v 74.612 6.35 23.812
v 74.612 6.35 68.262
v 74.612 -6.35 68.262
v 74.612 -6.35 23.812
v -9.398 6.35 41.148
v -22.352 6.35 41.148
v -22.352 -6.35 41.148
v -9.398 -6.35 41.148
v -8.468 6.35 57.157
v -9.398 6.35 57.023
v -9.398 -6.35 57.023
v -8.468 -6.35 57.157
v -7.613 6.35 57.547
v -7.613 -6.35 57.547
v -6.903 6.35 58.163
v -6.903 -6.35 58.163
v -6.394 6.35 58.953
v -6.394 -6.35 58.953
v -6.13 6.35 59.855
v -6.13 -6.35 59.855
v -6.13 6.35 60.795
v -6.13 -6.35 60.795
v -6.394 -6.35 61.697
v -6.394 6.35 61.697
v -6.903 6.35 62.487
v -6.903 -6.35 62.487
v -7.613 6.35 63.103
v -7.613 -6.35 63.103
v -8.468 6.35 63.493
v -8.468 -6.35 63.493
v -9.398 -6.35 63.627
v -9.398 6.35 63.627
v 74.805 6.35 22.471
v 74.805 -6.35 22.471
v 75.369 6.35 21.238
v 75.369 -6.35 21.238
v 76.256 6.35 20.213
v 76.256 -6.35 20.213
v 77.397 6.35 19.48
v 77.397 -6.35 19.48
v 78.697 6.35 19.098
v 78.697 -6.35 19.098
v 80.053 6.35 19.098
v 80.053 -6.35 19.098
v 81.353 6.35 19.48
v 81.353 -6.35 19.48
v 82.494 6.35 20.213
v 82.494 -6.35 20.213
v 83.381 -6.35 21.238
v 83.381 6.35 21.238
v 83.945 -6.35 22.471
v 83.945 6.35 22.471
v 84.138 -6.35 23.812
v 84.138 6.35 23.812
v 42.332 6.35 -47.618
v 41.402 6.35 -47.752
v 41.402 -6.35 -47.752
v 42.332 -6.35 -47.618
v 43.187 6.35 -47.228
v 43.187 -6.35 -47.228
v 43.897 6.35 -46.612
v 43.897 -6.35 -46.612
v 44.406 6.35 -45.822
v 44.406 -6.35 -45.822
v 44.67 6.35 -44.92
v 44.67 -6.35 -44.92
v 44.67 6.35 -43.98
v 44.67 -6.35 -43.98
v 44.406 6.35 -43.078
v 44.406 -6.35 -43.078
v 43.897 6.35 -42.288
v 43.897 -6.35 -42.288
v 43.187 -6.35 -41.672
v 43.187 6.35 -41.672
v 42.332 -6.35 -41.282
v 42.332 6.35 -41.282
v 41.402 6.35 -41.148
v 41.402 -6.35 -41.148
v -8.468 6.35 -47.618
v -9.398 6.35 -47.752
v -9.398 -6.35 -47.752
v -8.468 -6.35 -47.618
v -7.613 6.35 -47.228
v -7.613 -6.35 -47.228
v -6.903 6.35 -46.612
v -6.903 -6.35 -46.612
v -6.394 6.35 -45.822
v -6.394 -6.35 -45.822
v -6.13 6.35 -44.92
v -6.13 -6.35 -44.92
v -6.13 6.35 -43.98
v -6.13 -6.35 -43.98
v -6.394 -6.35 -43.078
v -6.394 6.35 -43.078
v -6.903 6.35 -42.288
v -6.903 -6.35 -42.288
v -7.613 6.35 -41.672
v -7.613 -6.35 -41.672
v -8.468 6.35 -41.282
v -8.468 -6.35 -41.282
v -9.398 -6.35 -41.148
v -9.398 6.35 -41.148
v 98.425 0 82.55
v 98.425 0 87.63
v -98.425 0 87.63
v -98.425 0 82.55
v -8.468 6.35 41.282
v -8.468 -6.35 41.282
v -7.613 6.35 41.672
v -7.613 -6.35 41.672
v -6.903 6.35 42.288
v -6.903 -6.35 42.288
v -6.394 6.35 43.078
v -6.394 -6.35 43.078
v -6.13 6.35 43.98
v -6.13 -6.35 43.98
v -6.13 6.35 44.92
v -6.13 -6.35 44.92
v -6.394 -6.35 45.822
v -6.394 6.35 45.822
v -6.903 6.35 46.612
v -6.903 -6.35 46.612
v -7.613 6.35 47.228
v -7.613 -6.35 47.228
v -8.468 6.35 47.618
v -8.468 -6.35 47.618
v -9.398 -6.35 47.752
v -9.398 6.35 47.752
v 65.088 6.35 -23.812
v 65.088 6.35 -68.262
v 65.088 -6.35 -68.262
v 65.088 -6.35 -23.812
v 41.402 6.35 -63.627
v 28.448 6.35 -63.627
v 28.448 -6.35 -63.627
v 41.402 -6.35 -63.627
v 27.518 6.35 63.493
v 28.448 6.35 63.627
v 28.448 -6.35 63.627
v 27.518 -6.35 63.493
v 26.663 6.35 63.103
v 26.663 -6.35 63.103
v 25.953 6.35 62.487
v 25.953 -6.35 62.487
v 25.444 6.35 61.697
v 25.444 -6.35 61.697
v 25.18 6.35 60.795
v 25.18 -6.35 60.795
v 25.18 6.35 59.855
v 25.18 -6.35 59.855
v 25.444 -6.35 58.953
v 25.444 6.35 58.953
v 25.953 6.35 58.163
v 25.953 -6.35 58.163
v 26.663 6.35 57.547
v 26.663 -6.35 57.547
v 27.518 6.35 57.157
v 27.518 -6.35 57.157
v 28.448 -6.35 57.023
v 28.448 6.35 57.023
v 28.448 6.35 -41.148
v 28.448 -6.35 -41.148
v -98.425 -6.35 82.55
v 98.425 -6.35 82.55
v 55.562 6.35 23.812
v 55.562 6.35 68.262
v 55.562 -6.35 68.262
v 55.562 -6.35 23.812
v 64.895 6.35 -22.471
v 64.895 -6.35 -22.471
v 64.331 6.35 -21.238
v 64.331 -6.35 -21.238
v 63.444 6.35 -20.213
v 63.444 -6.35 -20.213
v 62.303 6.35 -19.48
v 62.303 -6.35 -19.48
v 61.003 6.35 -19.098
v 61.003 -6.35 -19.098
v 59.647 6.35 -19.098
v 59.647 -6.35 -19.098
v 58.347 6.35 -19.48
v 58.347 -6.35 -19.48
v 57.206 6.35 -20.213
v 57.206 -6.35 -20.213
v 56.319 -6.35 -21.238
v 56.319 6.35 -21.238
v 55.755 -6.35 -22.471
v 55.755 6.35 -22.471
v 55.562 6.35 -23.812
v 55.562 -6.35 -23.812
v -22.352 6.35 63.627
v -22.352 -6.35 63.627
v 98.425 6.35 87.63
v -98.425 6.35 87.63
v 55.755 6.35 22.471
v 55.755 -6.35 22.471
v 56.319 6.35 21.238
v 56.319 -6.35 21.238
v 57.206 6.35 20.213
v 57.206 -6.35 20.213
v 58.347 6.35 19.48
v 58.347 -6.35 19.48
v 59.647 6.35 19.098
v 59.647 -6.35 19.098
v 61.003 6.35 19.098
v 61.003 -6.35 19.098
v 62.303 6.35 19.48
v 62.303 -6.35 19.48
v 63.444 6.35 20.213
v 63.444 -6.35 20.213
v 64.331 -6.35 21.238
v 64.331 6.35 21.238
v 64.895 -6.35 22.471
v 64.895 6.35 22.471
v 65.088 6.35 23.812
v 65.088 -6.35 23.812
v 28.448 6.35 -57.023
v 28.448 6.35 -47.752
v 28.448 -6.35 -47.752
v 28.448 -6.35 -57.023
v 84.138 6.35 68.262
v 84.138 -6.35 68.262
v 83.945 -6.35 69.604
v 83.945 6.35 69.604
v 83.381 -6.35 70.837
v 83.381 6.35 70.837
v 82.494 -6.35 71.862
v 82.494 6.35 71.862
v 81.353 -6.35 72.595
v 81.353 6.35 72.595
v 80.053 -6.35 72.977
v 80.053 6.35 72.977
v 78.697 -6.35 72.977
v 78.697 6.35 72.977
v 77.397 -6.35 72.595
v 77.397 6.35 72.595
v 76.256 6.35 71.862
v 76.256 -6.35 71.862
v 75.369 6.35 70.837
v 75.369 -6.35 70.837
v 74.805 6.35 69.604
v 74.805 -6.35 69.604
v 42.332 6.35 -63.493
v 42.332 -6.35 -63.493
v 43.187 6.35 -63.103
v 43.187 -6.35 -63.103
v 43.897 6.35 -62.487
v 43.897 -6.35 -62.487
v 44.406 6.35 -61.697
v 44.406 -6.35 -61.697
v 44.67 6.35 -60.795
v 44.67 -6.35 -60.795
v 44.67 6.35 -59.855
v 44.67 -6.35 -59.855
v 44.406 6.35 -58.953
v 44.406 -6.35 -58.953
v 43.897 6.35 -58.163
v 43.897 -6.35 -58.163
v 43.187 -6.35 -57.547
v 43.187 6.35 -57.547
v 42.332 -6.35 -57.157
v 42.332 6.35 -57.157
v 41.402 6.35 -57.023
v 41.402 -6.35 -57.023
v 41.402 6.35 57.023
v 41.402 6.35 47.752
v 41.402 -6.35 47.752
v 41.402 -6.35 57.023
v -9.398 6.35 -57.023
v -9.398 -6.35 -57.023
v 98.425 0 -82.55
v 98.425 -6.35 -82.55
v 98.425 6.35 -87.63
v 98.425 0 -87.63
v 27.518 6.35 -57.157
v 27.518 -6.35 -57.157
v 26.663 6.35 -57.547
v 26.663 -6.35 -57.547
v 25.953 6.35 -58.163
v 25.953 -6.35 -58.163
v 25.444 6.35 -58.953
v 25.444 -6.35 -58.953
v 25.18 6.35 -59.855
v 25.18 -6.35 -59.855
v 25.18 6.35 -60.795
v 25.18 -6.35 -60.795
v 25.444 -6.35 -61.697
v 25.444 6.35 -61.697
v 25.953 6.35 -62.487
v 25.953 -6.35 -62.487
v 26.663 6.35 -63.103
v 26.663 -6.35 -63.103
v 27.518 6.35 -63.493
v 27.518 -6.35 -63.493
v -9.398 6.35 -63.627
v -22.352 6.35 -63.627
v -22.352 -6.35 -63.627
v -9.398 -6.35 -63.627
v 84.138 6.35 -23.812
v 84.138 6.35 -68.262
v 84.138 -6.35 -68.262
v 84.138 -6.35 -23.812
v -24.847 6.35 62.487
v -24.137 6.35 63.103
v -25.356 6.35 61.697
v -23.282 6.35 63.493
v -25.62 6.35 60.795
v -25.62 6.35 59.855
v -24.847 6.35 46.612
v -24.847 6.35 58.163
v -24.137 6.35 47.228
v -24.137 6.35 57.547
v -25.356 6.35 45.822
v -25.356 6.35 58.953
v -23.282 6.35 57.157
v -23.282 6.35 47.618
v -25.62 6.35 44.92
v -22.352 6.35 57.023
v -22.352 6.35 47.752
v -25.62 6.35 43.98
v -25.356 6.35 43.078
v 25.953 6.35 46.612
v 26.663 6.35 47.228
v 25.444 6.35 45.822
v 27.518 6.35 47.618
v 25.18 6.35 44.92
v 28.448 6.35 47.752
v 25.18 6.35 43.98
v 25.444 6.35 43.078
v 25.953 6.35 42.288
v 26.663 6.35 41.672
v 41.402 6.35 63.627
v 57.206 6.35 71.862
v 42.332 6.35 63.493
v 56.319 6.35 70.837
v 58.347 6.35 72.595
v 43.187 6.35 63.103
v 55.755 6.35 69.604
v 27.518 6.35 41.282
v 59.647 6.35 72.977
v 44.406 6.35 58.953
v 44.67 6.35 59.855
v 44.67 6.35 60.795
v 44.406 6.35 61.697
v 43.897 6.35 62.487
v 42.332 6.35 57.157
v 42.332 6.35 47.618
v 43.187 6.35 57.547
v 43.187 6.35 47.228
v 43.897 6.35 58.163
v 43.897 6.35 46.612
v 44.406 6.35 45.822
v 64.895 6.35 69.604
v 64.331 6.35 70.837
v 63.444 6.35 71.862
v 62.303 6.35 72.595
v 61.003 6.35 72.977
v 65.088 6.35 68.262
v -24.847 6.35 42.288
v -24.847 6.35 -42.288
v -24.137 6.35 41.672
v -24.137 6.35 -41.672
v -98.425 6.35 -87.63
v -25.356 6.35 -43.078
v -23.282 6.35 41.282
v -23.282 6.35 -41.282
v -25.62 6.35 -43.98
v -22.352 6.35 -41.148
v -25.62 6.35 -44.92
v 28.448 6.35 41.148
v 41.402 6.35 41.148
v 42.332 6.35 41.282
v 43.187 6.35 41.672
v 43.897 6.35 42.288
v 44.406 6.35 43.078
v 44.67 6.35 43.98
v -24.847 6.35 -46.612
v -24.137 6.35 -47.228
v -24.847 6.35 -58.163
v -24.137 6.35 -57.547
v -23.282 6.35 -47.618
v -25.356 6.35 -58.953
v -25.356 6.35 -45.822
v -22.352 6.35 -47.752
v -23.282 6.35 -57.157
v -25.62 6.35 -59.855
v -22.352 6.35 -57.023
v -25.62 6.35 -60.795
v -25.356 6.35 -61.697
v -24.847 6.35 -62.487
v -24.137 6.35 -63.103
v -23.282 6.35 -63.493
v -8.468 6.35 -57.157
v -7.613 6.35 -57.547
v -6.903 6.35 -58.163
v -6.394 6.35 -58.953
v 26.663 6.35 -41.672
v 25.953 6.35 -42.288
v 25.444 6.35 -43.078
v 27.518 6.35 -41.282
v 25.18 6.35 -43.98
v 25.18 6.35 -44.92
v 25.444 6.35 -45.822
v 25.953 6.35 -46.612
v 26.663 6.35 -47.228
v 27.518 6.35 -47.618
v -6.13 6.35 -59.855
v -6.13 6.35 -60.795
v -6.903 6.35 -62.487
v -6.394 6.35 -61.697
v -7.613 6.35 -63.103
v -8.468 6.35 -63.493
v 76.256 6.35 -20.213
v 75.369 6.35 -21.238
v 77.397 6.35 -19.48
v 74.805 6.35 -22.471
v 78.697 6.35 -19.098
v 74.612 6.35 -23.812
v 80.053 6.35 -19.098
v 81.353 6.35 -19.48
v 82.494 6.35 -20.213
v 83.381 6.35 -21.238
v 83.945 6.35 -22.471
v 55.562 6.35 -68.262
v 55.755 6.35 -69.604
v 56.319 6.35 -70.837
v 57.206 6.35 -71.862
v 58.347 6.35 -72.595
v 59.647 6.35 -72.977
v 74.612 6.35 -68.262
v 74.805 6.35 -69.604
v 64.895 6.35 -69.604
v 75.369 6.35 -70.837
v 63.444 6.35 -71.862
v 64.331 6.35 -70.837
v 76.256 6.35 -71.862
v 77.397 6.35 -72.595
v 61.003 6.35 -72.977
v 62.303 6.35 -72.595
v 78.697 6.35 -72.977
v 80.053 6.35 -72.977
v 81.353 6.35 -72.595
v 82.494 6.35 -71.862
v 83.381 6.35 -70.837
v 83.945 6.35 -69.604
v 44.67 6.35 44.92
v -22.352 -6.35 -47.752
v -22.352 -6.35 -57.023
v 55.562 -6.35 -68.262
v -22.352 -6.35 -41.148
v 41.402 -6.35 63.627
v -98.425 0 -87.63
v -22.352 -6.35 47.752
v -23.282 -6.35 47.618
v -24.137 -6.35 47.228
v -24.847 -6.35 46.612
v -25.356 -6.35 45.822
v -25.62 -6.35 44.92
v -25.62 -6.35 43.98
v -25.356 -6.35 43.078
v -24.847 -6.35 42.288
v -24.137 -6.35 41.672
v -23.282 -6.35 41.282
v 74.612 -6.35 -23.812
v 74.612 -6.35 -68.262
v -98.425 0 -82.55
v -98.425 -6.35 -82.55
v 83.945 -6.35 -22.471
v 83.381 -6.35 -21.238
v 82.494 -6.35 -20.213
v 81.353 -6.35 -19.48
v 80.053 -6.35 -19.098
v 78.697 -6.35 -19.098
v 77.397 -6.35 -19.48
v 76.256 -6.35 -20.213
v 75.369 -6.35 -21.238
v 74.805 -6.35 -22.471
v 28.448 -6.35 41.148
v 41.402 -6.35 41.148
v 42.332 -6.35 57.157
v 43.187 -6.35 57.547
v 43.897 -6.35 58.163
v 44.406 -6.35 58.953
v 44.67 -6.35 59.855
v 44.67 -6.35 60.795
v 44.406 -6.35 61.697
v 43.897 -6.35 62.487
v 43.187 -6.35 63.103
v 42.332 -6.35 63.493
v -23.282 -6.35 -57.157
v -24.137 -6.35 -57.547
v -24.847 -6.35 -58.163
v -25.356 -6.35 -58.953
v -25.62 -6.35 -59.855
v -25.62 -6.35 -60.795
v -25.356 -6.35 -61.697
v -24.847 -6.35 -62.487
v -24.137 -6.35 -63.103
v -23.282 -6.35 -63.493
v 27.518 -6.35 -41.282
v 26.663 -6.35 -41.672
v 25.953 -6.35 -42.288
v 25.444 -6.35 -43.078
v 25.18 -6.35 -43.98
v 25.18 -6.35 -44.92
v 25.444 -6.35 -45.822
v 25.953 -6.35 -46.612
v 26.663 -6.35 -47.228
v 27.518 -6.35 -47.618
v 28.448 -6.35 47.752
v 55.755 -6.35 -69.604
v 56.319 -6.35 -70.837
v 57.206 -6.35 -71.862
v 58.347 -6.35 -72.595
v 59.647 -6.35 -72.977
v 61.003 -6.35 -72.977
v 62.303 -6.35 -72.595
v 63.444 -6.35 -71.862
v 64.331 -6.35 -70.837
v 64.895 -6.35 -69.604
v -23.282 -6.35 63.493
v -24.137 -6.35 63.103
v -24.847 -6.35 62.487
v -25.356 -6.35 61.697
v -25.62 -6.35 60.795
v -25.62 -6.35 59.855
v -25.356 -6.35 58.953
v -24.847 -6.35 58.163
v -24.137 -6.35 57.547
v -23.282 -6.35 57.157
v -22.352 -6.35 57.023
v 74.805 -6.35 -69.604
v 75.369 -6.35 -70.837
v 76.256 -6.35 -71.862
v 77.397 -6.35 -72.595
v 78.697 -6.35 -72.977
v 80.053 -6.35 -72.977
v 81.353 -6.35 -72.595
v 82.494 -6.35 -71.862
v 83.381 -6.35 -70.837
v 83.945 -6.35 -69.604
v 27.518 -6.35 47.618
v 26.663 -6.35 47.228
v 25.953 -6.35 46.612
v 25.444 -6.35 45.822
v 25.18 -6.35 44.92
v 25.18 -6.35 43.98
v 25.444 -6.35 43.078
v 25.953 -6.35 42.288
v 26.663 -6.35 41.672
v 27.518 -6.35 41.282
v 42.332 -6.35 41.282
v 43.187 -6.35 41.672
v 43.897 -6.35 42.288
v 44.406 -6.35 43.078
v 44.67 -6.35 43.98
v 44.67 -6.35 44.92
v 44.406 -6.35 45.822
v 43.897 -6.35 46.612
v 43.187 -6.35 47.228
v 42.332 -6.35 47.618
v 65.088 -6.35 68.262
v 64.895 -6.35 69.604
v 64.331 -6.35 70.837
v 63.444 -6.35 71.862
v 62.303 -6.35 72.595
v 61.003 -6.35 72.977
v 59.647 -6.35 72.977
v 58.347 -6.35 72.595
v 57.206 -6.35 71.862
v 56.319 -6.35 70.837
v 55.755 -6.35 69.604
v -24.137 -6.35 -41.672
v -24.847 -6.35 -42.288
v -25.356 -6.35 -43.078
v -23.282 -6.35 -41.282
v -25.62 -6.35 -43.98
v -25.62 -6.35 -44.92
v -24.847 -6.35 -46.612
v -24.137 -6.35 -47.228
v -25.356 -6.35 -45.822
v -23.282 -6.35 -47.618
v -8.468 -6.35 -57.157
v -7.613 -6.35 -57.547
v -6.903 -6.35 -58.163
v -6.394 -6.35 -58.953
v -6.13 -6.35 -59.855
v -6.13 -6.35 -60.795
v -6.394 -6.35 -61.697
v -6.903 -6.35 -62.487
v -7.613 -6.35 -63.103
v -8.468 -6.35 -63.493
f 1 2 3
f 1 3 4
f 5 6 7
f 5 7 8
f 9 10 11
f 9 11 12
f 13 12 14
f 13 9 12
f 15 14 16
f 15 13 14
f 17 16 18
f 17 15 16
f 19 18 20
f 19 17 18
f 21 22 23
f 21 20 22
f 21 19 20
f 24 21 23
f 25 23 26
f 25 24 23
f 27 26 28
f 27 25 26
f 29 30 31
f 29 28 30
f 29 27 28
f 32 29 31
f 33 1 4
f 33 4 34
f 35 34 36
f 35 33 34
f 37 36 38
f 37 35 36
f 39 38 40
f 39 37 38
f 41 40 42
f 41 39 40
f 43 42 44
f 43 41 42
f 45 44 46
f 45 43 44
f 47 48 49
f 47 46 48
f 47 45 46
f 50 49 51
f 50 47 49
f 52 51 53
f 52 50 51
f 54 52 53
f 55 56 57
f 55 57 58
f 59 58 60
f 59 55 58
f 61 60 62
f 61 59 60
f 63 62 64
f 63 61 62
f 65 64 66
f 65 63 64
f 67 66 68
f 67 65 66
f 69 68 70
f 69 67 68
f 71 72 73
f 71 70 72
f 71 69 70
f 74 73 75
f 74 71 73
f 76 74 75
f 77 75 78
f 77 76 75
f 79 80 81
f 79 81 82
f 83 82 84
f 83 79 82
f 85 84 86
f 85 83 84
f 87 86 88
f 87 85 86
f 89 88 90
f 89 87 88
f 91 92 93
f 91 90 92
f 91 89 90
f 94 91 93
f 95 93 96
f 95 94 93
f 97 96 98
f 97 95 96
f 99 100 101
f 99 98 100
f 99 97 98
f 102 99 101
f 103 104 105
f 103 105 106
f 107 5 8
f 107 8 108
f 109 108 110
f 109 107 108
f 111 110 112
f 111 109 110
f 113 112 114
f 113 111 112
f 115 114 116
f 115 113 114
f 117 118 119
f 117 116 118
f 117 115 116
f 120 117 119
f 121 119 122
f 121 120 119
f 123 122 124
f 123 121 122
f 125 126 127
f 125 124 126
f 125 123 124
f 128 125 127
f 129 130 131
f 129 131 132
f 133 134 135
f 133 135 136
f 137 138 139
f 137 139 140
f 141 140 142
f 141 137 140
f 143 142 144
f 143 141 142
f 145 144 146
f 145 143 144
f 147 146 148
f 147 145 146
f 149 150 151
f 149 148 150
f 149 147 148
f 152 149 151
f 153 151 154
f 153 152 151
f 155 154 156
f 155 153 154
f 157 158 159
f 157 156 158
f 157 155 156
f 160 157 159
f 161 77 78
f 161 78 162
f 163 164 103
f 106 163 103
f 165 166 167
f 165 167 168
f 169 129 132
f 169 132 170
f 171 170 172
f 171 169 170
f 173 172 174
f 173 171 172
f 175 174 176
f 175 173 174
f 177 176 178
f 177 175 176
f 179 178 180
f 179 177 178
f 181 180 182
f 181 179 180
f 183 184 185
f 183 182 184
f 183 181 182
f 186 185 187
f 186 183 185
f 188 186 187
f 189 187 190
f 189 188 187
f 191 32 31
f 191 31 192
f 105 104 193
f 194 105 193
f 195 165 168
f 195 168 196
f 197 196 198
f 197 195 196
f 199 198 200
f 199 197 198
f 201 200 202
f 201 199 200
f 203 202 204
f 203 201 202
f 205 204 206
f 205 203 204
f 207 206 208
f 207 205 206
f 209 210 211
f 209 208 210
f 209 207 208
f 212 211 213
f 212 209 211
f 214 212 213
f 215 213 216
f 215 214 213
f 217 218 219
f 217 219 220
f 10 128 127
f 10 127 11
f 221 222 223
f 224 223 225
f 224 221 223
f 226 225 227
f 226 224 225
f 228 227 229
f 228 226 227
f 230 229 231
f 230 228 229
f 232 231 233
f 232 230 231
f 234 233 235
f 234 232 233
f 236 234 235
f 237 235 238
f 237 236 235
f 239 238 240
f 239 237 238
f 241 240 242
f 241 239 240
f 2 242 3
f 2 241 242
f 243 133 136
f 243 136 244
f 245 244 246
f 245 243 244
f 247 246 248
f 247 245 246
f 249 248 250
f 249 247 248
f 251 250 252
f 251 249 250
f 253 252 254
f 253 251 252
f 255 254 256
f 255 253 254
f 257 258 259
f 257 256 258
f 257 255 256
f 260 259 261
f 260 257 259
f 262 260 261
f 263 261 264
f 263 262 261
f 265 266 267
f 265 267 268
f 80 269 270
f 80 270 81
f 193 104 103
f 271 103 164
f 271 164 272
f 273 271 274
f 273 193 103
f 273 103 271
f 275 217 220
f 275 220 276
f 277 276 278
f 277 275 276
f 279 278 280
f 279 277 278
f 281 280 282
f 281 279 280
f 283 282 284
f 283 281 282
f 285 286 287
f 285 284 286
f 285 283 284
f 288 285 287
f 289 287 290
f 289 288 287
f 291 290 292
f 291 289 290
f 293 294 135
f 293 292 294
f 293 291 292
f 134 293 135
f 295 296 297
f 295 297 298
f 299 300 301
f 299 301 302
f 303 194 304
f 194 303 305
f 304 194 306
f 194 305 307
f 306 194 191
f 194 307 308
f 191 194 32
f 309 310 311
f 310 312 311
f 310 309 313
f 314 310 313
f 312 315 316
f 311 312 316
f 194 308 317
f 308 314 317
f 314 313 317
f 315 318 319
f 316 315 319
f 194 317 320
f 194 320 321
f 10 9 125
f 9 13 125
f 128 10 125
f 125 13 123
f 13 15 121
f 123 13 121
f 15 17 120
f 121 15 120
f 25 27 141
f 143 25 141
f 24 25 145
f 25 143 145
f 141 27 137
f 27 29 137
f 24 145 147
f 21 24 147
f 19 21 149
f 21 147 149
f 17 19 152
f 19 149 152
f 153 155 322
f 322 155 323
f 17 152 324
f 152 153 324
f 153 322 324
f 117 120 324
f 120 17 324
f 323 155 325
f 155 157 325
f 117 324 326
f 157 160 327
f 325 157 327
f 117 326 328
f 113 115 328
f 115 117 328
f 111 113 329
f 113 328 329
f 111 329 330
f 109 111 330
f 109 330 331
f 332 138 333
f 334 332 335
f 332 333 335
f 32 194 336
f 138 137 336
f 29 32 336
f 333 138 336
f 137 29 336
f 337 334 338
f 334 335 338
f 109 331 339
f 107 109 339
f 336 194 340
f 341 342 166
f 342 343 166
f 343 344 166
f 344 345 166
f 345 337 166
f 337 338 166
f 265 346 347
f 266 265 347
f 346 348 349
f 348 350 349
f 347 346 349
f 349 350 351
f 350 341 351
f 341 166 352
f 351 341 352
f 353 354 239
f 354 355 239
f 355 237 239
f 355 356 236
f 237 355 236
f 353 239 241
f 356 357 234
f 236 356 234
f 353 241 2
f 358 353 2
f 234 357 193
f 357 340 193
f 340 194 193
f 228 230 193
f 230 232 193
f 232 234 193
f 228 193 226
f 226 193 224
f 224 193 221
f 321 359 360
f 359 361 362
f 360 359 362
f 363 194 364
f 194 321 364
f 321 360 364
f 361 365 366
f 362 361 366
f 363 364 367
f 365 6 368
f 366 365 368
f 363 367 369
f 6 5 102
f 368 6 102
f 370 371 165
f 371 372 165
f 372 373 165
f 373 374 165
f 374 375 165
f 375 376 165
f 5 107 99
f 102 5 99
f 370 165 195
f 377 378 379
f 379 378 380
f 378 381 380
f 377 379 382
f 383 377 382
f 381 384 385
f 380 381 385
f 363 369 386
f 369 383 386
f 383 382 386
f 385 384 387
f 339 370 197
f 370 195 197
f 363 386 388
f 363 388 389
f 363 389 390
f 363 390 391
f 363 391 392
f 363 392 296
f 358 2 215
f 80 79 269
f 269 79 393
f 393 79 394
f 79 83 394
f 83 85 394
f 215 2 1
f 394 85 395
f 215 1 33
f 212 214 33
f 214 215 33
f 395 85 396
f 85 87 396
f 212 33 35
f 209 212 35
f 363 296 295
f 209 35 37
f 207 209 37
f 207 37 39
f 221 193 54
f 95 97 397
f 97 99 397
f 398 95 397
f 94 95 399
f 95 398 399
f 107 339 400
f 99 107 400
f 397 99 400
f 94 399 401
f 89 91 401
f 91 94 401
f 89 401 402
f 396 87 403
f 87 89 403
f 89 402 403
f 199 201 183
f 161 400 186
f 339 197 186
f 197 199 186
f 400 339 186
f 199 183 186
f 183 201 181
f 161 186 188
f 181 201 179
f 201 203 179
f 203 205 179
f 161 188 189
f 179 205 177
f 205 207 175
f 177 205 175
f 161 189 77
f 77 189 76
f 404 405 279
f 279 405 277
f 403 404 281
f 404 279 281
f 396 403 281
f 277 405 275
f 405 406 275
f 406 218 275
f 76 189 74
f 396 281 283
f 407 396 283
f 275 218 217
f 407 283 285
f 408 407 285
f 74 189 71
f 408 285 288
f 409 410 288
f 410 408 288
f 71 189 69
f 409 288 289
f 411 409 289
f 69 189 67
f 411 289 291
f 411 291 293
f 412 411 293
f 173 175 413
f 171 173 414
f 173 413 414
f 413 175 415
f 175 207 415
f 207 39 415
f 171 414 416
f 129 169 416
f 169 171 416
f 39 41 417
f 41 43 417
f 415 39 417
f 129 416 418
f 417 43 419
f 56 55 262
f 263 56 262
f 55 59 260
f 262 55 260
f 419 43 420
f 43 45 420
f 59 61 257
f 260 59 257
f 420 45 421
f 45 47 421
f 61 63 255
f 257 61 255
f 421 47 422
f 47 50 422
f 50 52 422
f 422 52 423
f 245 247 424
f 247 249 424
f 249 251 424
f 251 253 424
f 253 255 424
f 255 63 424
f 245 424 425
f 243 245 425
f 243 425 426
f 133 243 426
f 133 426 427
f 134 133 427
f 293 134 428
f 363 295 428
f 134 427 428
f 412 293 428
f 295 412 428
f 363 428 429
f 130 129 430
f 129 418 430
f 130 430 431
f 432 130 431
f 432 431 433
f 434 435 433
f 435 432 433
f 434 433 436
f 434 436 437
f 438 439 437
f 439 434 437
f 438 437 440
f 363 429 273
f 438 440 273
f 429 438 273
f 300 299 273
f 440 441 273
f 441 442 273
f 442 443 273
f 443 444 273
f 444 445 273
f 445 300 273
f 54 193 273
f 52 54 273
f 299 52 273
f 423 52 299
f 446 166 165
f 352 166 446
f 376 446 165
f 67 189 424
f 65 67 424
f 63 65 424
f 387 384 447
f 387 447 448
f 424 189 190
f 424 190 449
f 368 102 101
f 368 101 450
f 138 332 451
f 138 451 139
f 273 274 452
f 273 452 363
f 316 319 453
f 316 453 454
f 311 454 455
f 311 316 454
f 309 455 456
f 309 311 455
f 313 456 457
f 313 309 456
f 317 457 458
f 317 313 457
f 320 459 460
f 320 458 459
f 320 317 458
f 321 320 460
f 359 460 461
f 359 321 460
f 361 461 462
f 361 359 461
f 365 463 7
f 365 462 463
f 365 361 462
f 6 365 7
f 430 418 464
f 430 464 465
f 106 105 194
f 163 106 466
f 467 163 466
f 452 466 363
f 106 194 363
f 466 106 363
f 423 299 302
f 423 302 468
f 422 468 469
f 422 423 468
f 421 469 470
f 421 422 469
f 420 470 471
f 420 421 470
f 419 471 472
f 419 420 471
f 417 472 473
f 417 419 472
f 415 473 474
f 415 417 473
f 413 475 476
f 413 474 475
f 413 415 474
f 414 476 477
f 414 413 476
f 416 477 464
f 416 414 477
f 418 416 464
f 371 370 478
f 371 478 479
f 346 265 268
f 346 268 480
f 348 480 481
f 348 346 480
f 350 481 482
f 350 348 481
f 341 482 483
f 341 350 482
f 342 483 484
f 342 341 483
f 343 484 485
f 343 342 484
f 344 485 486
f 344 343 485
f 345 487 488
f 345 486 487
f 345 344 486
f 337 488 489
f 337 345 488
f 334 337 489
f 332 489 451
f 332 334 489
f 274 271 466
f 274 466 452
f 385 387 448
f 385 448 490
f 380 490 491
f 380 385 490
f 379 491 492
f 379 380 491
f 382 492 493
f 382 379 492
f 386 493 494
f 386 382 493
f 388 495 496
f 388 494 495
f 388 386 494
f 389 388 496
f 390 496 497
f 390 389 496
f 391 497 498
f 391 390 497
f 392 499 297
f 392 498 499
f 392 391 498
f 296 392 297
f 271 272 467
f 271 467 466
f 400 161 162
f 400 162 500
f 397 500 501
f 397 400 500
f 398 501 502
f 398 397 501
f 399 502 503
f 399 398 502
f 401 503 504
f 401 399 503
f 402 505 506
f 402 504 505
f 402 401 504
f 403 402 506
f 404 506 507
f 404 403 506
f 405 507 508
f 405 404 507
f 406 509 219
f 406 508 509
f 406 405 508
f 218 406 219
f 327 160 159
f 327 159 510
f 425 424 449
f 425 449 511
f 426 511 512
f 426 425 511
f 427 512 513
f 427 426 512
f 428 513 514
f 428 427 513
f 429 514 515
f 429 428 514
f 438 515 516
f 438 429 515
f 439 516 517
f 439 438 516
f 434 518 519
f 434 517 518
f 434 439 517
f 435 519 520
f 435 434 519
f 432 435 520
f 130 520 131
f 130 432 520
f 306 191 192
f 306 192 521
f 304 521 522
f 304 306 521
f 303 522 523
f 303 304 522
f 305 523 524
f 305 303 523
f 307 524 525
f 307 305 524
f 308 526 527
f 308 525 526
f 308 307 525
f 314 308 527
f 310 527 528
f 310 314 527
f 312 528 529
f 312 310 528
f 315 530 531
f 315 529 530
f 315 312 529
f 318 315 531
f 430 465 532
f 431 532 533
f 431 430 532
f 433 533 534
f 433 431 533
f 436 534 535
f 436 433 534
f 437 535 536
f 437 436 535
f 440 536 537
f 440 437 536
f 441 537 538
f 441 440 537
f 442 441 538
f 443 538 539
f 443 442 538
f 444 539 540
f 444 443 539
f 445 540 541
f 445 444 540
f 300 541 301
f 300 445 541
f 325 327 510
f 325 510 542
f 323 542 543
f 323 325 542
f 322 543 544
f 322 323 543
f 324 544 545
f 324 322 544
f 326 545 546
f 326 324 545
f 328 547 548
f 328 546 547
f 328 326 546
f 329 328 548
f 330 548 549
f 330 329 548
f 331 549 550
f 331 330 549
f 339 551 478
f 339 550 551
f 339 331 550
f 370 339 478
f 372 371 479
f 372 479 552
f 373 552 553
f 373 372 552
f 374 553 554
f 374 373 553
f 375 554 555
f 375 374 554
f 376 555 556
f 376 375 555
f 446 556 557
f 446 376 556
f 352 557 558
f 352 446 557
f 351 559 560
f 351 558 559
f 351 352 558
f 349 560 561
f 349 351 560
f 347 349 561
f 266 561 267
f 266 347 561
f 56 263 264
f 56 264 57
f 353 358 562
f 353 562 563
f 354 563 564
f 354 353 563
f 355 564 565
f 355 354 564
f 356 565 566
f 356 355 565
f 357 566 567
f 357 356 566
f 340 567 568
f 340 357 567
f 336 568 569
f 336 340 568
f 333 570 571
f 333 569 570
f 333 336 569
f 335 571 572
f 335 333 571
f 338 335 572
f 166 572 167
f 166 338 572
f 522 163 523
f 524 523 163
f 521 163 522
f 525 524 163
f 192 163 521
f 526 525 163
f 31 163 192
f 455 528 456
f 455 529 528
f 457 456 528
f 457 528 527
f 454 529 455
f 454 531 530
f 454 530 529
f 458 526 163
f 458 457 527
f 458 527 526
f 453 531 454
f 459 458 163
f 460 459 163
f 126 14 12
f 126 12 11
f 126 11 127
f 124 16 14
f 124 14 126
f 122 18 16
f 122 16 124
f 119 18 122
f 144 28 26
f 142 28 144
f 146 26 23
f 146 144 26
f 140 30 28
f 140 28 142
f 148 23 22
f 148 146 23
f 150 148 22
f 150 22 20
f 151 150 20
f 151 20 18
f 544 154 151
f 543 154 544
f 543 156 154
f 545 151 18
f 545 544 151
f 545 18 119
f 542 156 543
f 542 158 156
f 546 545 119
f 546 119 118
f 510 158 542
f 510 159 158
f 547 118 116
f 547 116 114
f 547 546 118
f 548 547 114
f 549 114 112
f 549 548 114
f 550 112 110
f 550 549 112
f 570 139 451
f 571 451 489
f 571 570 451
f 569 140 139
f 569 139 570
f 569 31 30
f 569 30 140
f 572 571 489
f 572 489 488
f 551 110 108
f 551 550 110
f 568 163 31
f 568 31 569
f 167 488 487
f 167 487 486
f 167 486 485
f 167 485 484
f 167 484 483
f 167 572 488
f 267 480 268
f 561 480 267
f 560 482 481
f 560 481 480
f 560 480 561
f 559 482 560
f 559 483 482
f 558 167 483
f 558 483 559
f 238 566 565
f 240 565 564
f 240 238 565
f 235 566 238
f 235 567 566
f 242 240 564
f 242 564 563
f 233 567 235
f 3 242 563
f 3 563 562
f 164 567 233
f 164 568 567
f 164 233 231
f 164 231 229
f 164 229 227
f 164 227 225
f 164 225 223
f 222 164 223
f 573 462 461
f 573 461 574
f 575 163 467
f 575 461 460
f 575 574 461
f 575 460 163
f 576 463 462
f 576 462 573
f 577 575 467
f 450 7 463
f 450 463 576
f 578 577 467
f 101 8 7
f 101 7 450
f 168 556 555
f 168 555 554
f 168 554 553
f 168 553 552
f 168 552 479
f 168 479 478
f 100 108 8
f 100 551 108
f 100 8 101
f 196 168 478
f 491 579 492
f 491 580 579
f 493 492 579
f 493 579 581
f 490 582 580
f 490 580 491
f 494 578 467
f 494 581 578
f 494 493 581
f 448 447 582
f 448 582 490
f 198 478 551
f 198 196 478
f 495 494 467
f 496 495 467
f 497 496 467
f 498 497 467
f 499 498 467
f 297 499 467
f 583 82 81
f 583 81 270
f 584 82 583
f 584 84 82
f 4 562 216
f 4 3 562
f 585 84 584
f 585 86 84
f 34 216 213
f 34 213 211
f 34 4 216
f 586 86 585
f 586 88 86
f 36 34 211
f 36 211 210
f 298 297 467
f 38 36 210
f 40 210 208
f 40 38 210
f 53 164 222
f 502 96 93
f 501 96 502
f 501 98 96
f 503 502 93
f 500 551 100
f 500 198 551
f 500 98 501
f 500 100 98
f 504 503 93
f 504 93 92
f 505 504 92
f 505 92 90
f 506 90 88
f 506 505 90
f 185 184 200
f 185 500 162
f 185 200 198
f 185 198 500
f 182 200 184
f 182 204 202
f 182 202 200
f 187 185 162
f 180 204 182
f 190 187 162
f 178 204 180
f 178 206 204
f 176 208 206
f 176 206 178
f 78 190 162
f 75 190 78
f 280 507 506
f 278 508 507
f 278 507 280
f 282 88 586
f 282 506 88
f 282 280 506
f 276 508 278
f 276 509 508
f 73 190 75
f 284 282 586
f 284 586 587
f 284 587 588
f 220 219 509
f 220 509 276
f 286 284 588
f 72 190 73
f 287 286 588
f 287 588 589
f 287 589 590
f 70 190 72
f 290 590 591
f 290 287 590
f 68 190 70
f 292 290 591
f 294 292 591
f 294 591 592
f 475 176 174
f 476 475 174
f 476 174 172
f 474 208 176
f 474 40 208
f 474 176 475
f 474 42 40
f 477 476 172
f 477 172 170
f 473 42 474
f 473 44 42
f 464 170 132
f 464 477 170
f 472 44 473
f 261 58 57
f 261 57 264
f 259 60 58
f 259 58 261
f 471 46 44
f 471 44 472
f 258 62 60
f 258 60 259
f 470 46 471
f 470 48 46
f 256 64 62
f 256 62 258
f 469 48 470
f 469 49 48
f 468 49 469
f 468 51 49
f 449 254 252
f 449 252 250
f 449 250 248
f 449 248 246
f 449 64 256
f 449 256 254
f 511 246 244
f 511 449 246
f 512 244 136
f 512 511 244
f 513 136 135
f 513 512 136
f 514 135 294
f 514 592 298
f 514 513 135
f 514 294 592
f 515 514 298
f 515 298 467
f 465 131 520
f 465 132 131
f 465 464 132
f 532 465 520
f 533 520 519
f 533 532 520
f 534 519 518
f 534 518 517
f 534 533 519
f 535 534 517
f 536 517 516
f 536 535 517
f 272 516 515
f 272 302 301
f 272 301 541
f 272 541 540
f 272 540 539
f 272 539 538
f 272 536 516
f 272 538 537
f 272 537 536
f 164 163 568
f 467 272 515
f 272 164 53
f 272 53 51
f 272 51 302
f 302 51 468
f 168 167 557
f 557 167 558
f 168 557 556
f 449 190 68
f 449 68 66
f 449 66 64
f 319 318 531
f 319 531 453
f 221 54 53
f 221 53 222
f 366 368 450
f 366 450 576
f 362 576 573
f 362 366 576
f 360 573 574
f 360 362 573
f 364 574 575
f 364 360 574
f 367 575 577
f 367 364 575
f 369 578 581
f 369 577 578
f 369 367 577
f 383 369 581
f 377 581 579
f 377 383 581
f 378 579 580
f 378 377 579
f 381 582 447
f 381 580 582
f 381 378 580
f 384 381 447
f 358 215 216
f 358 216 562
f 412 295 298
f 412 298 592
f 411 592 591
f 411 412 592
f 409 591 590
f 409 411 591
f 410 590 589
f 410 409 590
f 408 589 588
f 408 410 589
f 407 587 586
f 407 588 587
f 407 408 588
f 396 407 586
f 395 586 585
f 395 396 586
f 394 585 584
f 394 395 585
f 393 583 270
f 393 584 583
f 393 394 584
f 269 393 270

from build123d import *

# Parameters (mm, degrees)
SKETCH1_W           = 175.26
SKETCH1_H           = 12.7
BOSS_EXTRUDE1_DEPTH = 98.425
SKETCH2_W           = 5.08
SKETCH2_H           = 6.35
CUT_EXTRUDE1_DEPTH  = 216.567302483
CUT_EXTRUDE2_DEPTH  = 133.392550867
CUT_EXTRUDE3_DEPTH  = 133.392550867


with BuildPart() as part:
    # Sketch1 → Boss-Extrude1 (new, symmetric)
    with BuildSketch(Plane(origin=(0, 0, 0), x_dir=(0, 0, -1), z_dir=(1, 0, 0))):
        Rectangle(SKETCH1_W, SKETCH1_H)
    extrude(amount=BOSS_EXTRUDE1_DEPTH, both=True)

    # Sketch2 → Cut-Extrude1 (cut, through all)
    with BuildSketch(Plane(origin=(98.425, 0, 0), x_dir=(0, 0, -1), z_dir=(1, 0, 0))):
        with Locations((-85.09, -3.175)):
            Rectangle(SKETCH2_W, SKETCH2_H)
        with Locations((85.09, -3.175)):
            Rectangle(SKETCH2_W, SKETCH2_H)
    extrude(amount=-CUT_EXTRUDE1_DEPTH, mode=Mode.SUBTRACT)

    # Sketch3 → Cut-Extrude2 (cut, through all)
    with BuildSketch(Plane(origin=(0, 6.35, 0), x_dir=(1, 0, 0), z_dir=(0, 1, 0))):
        with BuildLine():
            Line((28.448, -41.148), (41.402, -41.148))
            ThreePointArc((41.402, -41.148), (44.704, -44.45), (41.402, -47.752))
            Line((41.402, -47.752), (41.402, -57.023))
            ThreePointArc((41.402, -57.023), (44.704, -60.325), (41.402, -63.627))
            Line((41.402, -63.627), (28.448, -63.627))
            ThreePointArc((28.448, -63.627), (25.146, -60.325), (28.448, -57.023))
            Line((28.448, -57.023), (28.448, -47.752))
            ThreePointArc((28.448, -47.752), (25.146, -44.45), (28.448, -41.148))
        make_face()
        with BuildLine():
            Line((-22.352, -41.148), (-9.398, -41.148))
            ThreePointArc((-9.398, -41.148), (-6.096, -44.45), (-9.398, -47.752))
            Line((-9.398, -47.752), (-9.398, -57.023))
            ThreePointArc((-9.398, -57.023), (-6.096, -60.325), (-9.398, -63.627))
            Line((-9.398, -63.627), (-22.352, -63.627))
            ThreePointArc((-22.352, -63.627), (-25.654, -60.325), (-22.352, -57.023))
            Line((-22.352, -57.023), (-22.352, -47.752))
            ThreePointArc((-22.352, -47.752), (-25.654, -44.45), (-22.352, -41.148))
        make_face()
        with BuildLine():
            Line((-22.352, 63.627), (-9.398, 63.627))
            ThreePointArc((-9.398, 63.627), (-6.096, 60.325), (-9.398, 57.023))
            Line((-9.398, 57.023), (-9.398, 47.752))
            ThreePointArc((-9.398, 47.752), (-6.096, 44.45), (-9.398, 41.148))
            Line((-9.398, 41.148), (-22.352, 41.148))
            ThreePointArc((-22.352, 41.148), (-25.654, 44.45), (-22.352, 47.752))
            Line((-22.352, 47.752), (-22.352, 57.023))
            ThreePointArc((-22.352, 57.023), (-25.654, 60.325), (-22.352, 63.627))
        make_face()
        with BuildLine():
            Line((28.448, 63.627), (41.402, 63.627))
            ThreePointArc((41.402, 63.627), (44.704, 60.325), (41.402, 57.023))
            Line((41.402, 57.023), (41.402, 47.752))
            ThreePointArc((41.402, 47.752), (44.704, 44.45), (41.402, 41.148))
            Line((41.402, 41.148), (28.448, 41.148))
            ThreePointArc((28.448, 41.148), (25.146, 44.45), (28.448, 47.752))
            Line((28.448, 47.752), (28.448, 57.023))
            ThreePointArc((28.448, 57.023), (25.146, 60.325), (28.448, 63.627))
        make_face()
    extrude(amount=-CUT_EXTRUDE2_DEPTH, mode=Mode.SUBTRACT)

    # Sketch4 → Cut-Extrude3 (cut, through all)
    with BuildSketch(Plane(origin=(0, 6.35, 0), x_dir=(1, 0, 0), z_dir=(0, 1, 0))):
        with BuildLine():
            Line((55.5625, -68.2625), (55.5625, -23.8125))
            ThreePointArc((55.5625, -23.8125), (60.325, -19.05), (65.0875, -23.8125))
            Line((65.0875, -23.8125), (65.0875, -68.2625))
            ThreePointArc((65.0875, -68.2625), (60.325, -73.025), (55.5625, -68.2625))
        make_face()
        with BuildLine():
            Line((55.5625, 23.8125), (55.5625, 68.2625))
            ThreePointArc((55.5625, 68.2625), (60.325, 73.025), (65.0875, 68.2625))
            Line((65.0875, 68.2625), (65.0875, 23.8125))
            ThreePointArc((65.0875, 23.8125), (60.325, 19.05), (55.5625, 23.8125))
        make_face()
        with BuildLine():
            Line((84.1375, 68.2625), (84.1375, 23.8125))
            ThreePointArc((84.1375, 23.8125), (79.375, 19.05), (74.6125, 23.8125))
            Line((74.6125, 23.8125), (74.6125, 68.2625))
            ThreePointArc((74.6125, 68.2625), (79.375, 73.025), (84.1375, 68.2625))
        make_face()
        with BuildLine():
            Line((84.1375, -23.8125), (84.1375, -68.2625))
            ThreePointArc((84.1375, -68.2625), (79.375, -73.025), (74.6125, -68.2625))
            Line((74.6125, -68.2625), (74.6125, -23.8125))
            ThreePointArc((74.6125, -23.8125), (79.375, -19.05), (84.1375, -23.8125))
        make_face()
    extrude(amount=-CUT_EXTRUDE3_DEPTH, mode=Mode.SUBTRACT)


solid = part.part
